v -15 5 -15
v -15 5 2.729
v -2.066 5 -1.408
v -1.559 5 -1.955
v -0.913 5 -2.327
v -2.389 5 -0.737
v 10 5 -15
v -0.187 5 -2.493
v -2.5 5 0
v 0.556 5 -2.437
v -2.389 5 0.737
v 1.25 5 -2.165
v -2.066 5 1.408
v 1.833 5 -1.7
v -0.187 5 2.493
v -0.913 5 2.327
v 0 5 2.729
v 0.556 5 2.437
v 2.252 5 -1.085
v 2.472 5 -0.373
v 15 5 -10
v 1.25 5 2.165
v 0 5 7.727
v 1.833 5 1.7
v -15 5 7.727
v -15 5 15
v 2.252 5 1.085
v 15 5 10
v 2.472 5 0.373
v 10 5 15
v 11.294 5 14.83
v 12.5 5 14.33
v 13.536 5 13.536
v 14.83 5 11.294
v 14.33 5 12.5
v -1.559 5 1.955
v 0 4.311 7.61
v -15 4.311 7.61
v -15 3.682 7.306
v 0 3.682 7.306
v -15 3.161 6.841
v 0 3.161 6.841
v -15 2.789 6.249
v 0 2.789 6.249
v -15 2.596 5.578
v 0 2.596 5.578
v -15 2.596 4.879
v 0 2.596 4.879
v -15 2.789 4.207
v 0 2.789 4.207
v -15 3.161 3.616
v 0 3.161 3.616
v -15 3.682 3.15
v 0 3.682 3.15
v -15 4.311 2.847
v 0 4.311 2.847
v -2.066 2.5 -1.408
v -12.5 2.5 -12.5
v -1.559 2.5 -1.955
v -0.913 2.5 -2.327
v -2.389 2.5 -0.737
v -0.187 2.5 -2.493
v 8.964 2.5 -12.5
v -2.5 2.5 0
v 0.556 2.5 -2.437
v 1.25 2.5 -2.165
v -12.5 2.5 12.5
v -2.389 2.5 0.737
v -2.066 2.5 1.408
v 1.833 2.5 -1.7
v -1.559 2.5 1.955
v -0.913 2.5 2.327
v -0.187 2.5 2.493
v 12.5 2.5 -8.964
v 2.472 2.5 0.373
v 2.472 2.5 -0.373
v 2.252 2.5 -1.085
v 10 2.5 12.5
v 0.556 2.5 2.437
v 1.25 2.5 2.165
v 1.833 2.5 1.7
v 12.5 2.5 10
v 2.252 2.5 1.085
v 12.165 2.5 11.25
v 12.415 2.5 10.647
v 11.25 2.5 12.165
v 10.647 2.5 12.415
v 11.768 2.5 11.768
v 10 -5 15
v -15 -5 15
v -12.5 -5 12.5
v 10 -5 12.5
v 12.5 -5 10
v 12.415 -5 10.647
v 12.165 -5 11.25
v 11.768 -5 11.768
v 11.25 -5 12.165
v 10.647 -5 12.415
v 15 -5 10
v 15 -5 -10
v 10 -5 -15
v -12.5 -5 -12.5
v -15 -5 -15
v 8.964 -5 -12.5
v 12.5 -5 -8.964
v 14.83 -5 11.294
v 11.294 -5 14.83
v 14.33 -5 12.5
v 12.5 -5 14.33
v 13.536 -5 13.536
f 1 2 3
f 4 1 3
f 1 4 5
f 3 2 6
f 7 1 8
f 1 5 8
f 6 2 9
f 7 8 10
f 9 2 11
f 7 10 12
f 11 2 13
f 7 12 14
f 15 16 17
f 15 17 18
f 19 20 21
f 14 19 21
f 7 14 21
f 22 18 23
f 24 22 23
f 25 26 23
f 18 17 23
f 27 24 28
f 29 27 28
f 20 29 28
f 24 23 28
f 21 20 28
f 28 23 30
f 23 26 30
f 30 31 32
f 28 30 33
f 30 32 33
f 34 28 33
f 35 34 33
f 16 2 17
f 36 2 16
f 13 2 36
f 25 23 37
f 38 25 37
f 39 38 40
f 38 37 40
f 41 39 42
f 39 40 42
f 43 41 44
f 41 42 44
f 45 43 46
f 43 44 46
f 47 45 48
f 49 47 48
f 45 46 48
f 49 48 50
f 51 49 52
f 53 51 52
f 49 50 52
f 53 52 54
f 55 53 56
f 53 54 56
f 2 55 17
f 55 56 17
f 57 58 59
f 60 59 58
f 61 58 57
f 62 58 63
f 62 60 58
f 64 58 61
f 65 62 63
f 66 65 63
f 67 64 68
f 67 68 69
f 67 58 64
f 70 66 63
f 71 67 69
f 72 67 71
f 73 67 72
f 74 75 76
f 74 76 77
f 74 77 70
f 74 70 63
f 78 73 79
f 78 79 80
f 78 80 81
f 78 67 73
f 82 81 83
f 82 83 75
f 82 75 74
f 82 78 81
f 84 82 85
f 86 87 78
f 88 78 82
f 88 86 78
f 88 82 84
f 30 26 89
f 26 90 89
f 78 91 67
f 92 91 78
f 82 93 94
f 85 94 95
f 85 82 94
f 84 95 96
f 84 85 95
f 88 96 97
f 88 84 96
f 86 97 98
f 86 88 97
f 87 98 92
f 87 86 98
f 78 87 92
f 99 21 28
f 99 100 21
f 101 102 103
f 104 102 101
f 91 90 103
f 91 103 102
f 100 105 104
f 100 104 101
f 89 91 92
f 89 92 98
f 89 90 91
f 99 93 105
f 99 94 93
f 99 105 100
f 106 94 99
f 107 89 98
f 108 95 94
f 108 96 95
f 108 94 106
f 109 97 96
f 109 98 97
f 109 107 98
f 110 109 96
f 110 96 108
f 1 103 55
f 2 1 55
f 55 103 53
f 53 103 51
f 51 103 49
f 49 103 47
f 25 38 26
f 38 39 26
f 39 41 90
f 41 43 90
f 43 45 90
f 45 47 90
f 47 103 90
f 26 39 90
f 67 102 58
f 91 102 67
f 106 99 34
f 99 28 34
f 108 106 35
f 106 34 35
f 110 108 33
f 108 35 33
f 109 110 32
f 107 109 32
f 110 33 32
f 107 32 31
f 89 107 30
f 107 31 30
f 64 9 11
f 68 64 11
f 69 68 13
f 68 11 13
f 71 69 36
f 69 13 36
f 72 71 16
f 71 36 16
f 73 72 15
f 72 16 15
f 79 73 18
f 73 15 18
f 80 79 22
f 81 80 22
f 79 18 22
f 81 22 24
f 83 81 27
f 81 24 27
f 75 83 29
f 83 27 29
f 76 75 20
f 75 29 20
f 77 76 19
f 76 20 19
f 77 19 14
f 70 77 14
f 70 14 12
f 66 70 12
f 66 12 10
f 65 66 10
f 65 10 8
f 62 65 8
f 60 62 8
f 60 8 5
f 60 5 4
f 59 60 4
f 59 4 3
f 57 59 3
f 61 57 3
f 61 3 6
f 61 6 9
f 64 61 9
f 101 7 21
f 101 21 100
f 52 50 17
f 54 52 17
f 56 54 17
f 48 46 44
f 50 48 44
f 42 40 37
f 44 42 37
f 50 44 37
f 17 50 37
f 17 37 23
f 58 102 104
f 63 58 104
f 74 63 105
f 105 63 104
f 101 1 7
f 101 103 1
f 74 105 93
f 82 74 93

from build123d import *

# Parameters (mm, degrees)
F0_W     = 30
F0_H     = 30
F1_DEPTH = 5
F2_R     = 5
F3_SIZE  = 5
F4_T     = -2.5
F6_D     = 5
F8_D     = 5
F8_DEPTH = 15.001


with BuildPart() as f1:
    # F0 (on Front) → F1 (new body, symmetric)
    with BuildSketch(Plane.XZ):
        Rectangle(F0_W, F0_H)
    extrude(amount=F1_DEPTH, both=True)

    # F2
    f2_edges = [f1.edges().sort_by_distance(p)[0] for p in [
        (15, 0, 15),
    ]]
    fillet(f2_edges, radius=F2_R)

    # F3
    f3_edges = [f1.edges().sort_by_distance(p)[0] for p in [
        (15, 0, -15),
    ]]
    chamfer(f3_edges, length=F3_SIZE)

    # F4
    f4_openings = [f1.faces().sort_by_distance(p)[0] for p in [
        (-0.273371, -5, 0.1045),
    ]]
    offset(amount=F4_T, openings=f4_openings)

    # F6 (through all)
    with Locations(Plane.XZ):
        with Locations((0, 0)):
            Hole(F6_D / 2)

    # F8 (through all, one way)
    with BuildSketch(Plane.YZ):
        with Locations((5.0715617836, 5.2282437682)):
            Circle(F8_D / 2)
    extrude(amount=-F8_DEPTH, mode=Mode.SUBTRACT)


solid = f1.part
